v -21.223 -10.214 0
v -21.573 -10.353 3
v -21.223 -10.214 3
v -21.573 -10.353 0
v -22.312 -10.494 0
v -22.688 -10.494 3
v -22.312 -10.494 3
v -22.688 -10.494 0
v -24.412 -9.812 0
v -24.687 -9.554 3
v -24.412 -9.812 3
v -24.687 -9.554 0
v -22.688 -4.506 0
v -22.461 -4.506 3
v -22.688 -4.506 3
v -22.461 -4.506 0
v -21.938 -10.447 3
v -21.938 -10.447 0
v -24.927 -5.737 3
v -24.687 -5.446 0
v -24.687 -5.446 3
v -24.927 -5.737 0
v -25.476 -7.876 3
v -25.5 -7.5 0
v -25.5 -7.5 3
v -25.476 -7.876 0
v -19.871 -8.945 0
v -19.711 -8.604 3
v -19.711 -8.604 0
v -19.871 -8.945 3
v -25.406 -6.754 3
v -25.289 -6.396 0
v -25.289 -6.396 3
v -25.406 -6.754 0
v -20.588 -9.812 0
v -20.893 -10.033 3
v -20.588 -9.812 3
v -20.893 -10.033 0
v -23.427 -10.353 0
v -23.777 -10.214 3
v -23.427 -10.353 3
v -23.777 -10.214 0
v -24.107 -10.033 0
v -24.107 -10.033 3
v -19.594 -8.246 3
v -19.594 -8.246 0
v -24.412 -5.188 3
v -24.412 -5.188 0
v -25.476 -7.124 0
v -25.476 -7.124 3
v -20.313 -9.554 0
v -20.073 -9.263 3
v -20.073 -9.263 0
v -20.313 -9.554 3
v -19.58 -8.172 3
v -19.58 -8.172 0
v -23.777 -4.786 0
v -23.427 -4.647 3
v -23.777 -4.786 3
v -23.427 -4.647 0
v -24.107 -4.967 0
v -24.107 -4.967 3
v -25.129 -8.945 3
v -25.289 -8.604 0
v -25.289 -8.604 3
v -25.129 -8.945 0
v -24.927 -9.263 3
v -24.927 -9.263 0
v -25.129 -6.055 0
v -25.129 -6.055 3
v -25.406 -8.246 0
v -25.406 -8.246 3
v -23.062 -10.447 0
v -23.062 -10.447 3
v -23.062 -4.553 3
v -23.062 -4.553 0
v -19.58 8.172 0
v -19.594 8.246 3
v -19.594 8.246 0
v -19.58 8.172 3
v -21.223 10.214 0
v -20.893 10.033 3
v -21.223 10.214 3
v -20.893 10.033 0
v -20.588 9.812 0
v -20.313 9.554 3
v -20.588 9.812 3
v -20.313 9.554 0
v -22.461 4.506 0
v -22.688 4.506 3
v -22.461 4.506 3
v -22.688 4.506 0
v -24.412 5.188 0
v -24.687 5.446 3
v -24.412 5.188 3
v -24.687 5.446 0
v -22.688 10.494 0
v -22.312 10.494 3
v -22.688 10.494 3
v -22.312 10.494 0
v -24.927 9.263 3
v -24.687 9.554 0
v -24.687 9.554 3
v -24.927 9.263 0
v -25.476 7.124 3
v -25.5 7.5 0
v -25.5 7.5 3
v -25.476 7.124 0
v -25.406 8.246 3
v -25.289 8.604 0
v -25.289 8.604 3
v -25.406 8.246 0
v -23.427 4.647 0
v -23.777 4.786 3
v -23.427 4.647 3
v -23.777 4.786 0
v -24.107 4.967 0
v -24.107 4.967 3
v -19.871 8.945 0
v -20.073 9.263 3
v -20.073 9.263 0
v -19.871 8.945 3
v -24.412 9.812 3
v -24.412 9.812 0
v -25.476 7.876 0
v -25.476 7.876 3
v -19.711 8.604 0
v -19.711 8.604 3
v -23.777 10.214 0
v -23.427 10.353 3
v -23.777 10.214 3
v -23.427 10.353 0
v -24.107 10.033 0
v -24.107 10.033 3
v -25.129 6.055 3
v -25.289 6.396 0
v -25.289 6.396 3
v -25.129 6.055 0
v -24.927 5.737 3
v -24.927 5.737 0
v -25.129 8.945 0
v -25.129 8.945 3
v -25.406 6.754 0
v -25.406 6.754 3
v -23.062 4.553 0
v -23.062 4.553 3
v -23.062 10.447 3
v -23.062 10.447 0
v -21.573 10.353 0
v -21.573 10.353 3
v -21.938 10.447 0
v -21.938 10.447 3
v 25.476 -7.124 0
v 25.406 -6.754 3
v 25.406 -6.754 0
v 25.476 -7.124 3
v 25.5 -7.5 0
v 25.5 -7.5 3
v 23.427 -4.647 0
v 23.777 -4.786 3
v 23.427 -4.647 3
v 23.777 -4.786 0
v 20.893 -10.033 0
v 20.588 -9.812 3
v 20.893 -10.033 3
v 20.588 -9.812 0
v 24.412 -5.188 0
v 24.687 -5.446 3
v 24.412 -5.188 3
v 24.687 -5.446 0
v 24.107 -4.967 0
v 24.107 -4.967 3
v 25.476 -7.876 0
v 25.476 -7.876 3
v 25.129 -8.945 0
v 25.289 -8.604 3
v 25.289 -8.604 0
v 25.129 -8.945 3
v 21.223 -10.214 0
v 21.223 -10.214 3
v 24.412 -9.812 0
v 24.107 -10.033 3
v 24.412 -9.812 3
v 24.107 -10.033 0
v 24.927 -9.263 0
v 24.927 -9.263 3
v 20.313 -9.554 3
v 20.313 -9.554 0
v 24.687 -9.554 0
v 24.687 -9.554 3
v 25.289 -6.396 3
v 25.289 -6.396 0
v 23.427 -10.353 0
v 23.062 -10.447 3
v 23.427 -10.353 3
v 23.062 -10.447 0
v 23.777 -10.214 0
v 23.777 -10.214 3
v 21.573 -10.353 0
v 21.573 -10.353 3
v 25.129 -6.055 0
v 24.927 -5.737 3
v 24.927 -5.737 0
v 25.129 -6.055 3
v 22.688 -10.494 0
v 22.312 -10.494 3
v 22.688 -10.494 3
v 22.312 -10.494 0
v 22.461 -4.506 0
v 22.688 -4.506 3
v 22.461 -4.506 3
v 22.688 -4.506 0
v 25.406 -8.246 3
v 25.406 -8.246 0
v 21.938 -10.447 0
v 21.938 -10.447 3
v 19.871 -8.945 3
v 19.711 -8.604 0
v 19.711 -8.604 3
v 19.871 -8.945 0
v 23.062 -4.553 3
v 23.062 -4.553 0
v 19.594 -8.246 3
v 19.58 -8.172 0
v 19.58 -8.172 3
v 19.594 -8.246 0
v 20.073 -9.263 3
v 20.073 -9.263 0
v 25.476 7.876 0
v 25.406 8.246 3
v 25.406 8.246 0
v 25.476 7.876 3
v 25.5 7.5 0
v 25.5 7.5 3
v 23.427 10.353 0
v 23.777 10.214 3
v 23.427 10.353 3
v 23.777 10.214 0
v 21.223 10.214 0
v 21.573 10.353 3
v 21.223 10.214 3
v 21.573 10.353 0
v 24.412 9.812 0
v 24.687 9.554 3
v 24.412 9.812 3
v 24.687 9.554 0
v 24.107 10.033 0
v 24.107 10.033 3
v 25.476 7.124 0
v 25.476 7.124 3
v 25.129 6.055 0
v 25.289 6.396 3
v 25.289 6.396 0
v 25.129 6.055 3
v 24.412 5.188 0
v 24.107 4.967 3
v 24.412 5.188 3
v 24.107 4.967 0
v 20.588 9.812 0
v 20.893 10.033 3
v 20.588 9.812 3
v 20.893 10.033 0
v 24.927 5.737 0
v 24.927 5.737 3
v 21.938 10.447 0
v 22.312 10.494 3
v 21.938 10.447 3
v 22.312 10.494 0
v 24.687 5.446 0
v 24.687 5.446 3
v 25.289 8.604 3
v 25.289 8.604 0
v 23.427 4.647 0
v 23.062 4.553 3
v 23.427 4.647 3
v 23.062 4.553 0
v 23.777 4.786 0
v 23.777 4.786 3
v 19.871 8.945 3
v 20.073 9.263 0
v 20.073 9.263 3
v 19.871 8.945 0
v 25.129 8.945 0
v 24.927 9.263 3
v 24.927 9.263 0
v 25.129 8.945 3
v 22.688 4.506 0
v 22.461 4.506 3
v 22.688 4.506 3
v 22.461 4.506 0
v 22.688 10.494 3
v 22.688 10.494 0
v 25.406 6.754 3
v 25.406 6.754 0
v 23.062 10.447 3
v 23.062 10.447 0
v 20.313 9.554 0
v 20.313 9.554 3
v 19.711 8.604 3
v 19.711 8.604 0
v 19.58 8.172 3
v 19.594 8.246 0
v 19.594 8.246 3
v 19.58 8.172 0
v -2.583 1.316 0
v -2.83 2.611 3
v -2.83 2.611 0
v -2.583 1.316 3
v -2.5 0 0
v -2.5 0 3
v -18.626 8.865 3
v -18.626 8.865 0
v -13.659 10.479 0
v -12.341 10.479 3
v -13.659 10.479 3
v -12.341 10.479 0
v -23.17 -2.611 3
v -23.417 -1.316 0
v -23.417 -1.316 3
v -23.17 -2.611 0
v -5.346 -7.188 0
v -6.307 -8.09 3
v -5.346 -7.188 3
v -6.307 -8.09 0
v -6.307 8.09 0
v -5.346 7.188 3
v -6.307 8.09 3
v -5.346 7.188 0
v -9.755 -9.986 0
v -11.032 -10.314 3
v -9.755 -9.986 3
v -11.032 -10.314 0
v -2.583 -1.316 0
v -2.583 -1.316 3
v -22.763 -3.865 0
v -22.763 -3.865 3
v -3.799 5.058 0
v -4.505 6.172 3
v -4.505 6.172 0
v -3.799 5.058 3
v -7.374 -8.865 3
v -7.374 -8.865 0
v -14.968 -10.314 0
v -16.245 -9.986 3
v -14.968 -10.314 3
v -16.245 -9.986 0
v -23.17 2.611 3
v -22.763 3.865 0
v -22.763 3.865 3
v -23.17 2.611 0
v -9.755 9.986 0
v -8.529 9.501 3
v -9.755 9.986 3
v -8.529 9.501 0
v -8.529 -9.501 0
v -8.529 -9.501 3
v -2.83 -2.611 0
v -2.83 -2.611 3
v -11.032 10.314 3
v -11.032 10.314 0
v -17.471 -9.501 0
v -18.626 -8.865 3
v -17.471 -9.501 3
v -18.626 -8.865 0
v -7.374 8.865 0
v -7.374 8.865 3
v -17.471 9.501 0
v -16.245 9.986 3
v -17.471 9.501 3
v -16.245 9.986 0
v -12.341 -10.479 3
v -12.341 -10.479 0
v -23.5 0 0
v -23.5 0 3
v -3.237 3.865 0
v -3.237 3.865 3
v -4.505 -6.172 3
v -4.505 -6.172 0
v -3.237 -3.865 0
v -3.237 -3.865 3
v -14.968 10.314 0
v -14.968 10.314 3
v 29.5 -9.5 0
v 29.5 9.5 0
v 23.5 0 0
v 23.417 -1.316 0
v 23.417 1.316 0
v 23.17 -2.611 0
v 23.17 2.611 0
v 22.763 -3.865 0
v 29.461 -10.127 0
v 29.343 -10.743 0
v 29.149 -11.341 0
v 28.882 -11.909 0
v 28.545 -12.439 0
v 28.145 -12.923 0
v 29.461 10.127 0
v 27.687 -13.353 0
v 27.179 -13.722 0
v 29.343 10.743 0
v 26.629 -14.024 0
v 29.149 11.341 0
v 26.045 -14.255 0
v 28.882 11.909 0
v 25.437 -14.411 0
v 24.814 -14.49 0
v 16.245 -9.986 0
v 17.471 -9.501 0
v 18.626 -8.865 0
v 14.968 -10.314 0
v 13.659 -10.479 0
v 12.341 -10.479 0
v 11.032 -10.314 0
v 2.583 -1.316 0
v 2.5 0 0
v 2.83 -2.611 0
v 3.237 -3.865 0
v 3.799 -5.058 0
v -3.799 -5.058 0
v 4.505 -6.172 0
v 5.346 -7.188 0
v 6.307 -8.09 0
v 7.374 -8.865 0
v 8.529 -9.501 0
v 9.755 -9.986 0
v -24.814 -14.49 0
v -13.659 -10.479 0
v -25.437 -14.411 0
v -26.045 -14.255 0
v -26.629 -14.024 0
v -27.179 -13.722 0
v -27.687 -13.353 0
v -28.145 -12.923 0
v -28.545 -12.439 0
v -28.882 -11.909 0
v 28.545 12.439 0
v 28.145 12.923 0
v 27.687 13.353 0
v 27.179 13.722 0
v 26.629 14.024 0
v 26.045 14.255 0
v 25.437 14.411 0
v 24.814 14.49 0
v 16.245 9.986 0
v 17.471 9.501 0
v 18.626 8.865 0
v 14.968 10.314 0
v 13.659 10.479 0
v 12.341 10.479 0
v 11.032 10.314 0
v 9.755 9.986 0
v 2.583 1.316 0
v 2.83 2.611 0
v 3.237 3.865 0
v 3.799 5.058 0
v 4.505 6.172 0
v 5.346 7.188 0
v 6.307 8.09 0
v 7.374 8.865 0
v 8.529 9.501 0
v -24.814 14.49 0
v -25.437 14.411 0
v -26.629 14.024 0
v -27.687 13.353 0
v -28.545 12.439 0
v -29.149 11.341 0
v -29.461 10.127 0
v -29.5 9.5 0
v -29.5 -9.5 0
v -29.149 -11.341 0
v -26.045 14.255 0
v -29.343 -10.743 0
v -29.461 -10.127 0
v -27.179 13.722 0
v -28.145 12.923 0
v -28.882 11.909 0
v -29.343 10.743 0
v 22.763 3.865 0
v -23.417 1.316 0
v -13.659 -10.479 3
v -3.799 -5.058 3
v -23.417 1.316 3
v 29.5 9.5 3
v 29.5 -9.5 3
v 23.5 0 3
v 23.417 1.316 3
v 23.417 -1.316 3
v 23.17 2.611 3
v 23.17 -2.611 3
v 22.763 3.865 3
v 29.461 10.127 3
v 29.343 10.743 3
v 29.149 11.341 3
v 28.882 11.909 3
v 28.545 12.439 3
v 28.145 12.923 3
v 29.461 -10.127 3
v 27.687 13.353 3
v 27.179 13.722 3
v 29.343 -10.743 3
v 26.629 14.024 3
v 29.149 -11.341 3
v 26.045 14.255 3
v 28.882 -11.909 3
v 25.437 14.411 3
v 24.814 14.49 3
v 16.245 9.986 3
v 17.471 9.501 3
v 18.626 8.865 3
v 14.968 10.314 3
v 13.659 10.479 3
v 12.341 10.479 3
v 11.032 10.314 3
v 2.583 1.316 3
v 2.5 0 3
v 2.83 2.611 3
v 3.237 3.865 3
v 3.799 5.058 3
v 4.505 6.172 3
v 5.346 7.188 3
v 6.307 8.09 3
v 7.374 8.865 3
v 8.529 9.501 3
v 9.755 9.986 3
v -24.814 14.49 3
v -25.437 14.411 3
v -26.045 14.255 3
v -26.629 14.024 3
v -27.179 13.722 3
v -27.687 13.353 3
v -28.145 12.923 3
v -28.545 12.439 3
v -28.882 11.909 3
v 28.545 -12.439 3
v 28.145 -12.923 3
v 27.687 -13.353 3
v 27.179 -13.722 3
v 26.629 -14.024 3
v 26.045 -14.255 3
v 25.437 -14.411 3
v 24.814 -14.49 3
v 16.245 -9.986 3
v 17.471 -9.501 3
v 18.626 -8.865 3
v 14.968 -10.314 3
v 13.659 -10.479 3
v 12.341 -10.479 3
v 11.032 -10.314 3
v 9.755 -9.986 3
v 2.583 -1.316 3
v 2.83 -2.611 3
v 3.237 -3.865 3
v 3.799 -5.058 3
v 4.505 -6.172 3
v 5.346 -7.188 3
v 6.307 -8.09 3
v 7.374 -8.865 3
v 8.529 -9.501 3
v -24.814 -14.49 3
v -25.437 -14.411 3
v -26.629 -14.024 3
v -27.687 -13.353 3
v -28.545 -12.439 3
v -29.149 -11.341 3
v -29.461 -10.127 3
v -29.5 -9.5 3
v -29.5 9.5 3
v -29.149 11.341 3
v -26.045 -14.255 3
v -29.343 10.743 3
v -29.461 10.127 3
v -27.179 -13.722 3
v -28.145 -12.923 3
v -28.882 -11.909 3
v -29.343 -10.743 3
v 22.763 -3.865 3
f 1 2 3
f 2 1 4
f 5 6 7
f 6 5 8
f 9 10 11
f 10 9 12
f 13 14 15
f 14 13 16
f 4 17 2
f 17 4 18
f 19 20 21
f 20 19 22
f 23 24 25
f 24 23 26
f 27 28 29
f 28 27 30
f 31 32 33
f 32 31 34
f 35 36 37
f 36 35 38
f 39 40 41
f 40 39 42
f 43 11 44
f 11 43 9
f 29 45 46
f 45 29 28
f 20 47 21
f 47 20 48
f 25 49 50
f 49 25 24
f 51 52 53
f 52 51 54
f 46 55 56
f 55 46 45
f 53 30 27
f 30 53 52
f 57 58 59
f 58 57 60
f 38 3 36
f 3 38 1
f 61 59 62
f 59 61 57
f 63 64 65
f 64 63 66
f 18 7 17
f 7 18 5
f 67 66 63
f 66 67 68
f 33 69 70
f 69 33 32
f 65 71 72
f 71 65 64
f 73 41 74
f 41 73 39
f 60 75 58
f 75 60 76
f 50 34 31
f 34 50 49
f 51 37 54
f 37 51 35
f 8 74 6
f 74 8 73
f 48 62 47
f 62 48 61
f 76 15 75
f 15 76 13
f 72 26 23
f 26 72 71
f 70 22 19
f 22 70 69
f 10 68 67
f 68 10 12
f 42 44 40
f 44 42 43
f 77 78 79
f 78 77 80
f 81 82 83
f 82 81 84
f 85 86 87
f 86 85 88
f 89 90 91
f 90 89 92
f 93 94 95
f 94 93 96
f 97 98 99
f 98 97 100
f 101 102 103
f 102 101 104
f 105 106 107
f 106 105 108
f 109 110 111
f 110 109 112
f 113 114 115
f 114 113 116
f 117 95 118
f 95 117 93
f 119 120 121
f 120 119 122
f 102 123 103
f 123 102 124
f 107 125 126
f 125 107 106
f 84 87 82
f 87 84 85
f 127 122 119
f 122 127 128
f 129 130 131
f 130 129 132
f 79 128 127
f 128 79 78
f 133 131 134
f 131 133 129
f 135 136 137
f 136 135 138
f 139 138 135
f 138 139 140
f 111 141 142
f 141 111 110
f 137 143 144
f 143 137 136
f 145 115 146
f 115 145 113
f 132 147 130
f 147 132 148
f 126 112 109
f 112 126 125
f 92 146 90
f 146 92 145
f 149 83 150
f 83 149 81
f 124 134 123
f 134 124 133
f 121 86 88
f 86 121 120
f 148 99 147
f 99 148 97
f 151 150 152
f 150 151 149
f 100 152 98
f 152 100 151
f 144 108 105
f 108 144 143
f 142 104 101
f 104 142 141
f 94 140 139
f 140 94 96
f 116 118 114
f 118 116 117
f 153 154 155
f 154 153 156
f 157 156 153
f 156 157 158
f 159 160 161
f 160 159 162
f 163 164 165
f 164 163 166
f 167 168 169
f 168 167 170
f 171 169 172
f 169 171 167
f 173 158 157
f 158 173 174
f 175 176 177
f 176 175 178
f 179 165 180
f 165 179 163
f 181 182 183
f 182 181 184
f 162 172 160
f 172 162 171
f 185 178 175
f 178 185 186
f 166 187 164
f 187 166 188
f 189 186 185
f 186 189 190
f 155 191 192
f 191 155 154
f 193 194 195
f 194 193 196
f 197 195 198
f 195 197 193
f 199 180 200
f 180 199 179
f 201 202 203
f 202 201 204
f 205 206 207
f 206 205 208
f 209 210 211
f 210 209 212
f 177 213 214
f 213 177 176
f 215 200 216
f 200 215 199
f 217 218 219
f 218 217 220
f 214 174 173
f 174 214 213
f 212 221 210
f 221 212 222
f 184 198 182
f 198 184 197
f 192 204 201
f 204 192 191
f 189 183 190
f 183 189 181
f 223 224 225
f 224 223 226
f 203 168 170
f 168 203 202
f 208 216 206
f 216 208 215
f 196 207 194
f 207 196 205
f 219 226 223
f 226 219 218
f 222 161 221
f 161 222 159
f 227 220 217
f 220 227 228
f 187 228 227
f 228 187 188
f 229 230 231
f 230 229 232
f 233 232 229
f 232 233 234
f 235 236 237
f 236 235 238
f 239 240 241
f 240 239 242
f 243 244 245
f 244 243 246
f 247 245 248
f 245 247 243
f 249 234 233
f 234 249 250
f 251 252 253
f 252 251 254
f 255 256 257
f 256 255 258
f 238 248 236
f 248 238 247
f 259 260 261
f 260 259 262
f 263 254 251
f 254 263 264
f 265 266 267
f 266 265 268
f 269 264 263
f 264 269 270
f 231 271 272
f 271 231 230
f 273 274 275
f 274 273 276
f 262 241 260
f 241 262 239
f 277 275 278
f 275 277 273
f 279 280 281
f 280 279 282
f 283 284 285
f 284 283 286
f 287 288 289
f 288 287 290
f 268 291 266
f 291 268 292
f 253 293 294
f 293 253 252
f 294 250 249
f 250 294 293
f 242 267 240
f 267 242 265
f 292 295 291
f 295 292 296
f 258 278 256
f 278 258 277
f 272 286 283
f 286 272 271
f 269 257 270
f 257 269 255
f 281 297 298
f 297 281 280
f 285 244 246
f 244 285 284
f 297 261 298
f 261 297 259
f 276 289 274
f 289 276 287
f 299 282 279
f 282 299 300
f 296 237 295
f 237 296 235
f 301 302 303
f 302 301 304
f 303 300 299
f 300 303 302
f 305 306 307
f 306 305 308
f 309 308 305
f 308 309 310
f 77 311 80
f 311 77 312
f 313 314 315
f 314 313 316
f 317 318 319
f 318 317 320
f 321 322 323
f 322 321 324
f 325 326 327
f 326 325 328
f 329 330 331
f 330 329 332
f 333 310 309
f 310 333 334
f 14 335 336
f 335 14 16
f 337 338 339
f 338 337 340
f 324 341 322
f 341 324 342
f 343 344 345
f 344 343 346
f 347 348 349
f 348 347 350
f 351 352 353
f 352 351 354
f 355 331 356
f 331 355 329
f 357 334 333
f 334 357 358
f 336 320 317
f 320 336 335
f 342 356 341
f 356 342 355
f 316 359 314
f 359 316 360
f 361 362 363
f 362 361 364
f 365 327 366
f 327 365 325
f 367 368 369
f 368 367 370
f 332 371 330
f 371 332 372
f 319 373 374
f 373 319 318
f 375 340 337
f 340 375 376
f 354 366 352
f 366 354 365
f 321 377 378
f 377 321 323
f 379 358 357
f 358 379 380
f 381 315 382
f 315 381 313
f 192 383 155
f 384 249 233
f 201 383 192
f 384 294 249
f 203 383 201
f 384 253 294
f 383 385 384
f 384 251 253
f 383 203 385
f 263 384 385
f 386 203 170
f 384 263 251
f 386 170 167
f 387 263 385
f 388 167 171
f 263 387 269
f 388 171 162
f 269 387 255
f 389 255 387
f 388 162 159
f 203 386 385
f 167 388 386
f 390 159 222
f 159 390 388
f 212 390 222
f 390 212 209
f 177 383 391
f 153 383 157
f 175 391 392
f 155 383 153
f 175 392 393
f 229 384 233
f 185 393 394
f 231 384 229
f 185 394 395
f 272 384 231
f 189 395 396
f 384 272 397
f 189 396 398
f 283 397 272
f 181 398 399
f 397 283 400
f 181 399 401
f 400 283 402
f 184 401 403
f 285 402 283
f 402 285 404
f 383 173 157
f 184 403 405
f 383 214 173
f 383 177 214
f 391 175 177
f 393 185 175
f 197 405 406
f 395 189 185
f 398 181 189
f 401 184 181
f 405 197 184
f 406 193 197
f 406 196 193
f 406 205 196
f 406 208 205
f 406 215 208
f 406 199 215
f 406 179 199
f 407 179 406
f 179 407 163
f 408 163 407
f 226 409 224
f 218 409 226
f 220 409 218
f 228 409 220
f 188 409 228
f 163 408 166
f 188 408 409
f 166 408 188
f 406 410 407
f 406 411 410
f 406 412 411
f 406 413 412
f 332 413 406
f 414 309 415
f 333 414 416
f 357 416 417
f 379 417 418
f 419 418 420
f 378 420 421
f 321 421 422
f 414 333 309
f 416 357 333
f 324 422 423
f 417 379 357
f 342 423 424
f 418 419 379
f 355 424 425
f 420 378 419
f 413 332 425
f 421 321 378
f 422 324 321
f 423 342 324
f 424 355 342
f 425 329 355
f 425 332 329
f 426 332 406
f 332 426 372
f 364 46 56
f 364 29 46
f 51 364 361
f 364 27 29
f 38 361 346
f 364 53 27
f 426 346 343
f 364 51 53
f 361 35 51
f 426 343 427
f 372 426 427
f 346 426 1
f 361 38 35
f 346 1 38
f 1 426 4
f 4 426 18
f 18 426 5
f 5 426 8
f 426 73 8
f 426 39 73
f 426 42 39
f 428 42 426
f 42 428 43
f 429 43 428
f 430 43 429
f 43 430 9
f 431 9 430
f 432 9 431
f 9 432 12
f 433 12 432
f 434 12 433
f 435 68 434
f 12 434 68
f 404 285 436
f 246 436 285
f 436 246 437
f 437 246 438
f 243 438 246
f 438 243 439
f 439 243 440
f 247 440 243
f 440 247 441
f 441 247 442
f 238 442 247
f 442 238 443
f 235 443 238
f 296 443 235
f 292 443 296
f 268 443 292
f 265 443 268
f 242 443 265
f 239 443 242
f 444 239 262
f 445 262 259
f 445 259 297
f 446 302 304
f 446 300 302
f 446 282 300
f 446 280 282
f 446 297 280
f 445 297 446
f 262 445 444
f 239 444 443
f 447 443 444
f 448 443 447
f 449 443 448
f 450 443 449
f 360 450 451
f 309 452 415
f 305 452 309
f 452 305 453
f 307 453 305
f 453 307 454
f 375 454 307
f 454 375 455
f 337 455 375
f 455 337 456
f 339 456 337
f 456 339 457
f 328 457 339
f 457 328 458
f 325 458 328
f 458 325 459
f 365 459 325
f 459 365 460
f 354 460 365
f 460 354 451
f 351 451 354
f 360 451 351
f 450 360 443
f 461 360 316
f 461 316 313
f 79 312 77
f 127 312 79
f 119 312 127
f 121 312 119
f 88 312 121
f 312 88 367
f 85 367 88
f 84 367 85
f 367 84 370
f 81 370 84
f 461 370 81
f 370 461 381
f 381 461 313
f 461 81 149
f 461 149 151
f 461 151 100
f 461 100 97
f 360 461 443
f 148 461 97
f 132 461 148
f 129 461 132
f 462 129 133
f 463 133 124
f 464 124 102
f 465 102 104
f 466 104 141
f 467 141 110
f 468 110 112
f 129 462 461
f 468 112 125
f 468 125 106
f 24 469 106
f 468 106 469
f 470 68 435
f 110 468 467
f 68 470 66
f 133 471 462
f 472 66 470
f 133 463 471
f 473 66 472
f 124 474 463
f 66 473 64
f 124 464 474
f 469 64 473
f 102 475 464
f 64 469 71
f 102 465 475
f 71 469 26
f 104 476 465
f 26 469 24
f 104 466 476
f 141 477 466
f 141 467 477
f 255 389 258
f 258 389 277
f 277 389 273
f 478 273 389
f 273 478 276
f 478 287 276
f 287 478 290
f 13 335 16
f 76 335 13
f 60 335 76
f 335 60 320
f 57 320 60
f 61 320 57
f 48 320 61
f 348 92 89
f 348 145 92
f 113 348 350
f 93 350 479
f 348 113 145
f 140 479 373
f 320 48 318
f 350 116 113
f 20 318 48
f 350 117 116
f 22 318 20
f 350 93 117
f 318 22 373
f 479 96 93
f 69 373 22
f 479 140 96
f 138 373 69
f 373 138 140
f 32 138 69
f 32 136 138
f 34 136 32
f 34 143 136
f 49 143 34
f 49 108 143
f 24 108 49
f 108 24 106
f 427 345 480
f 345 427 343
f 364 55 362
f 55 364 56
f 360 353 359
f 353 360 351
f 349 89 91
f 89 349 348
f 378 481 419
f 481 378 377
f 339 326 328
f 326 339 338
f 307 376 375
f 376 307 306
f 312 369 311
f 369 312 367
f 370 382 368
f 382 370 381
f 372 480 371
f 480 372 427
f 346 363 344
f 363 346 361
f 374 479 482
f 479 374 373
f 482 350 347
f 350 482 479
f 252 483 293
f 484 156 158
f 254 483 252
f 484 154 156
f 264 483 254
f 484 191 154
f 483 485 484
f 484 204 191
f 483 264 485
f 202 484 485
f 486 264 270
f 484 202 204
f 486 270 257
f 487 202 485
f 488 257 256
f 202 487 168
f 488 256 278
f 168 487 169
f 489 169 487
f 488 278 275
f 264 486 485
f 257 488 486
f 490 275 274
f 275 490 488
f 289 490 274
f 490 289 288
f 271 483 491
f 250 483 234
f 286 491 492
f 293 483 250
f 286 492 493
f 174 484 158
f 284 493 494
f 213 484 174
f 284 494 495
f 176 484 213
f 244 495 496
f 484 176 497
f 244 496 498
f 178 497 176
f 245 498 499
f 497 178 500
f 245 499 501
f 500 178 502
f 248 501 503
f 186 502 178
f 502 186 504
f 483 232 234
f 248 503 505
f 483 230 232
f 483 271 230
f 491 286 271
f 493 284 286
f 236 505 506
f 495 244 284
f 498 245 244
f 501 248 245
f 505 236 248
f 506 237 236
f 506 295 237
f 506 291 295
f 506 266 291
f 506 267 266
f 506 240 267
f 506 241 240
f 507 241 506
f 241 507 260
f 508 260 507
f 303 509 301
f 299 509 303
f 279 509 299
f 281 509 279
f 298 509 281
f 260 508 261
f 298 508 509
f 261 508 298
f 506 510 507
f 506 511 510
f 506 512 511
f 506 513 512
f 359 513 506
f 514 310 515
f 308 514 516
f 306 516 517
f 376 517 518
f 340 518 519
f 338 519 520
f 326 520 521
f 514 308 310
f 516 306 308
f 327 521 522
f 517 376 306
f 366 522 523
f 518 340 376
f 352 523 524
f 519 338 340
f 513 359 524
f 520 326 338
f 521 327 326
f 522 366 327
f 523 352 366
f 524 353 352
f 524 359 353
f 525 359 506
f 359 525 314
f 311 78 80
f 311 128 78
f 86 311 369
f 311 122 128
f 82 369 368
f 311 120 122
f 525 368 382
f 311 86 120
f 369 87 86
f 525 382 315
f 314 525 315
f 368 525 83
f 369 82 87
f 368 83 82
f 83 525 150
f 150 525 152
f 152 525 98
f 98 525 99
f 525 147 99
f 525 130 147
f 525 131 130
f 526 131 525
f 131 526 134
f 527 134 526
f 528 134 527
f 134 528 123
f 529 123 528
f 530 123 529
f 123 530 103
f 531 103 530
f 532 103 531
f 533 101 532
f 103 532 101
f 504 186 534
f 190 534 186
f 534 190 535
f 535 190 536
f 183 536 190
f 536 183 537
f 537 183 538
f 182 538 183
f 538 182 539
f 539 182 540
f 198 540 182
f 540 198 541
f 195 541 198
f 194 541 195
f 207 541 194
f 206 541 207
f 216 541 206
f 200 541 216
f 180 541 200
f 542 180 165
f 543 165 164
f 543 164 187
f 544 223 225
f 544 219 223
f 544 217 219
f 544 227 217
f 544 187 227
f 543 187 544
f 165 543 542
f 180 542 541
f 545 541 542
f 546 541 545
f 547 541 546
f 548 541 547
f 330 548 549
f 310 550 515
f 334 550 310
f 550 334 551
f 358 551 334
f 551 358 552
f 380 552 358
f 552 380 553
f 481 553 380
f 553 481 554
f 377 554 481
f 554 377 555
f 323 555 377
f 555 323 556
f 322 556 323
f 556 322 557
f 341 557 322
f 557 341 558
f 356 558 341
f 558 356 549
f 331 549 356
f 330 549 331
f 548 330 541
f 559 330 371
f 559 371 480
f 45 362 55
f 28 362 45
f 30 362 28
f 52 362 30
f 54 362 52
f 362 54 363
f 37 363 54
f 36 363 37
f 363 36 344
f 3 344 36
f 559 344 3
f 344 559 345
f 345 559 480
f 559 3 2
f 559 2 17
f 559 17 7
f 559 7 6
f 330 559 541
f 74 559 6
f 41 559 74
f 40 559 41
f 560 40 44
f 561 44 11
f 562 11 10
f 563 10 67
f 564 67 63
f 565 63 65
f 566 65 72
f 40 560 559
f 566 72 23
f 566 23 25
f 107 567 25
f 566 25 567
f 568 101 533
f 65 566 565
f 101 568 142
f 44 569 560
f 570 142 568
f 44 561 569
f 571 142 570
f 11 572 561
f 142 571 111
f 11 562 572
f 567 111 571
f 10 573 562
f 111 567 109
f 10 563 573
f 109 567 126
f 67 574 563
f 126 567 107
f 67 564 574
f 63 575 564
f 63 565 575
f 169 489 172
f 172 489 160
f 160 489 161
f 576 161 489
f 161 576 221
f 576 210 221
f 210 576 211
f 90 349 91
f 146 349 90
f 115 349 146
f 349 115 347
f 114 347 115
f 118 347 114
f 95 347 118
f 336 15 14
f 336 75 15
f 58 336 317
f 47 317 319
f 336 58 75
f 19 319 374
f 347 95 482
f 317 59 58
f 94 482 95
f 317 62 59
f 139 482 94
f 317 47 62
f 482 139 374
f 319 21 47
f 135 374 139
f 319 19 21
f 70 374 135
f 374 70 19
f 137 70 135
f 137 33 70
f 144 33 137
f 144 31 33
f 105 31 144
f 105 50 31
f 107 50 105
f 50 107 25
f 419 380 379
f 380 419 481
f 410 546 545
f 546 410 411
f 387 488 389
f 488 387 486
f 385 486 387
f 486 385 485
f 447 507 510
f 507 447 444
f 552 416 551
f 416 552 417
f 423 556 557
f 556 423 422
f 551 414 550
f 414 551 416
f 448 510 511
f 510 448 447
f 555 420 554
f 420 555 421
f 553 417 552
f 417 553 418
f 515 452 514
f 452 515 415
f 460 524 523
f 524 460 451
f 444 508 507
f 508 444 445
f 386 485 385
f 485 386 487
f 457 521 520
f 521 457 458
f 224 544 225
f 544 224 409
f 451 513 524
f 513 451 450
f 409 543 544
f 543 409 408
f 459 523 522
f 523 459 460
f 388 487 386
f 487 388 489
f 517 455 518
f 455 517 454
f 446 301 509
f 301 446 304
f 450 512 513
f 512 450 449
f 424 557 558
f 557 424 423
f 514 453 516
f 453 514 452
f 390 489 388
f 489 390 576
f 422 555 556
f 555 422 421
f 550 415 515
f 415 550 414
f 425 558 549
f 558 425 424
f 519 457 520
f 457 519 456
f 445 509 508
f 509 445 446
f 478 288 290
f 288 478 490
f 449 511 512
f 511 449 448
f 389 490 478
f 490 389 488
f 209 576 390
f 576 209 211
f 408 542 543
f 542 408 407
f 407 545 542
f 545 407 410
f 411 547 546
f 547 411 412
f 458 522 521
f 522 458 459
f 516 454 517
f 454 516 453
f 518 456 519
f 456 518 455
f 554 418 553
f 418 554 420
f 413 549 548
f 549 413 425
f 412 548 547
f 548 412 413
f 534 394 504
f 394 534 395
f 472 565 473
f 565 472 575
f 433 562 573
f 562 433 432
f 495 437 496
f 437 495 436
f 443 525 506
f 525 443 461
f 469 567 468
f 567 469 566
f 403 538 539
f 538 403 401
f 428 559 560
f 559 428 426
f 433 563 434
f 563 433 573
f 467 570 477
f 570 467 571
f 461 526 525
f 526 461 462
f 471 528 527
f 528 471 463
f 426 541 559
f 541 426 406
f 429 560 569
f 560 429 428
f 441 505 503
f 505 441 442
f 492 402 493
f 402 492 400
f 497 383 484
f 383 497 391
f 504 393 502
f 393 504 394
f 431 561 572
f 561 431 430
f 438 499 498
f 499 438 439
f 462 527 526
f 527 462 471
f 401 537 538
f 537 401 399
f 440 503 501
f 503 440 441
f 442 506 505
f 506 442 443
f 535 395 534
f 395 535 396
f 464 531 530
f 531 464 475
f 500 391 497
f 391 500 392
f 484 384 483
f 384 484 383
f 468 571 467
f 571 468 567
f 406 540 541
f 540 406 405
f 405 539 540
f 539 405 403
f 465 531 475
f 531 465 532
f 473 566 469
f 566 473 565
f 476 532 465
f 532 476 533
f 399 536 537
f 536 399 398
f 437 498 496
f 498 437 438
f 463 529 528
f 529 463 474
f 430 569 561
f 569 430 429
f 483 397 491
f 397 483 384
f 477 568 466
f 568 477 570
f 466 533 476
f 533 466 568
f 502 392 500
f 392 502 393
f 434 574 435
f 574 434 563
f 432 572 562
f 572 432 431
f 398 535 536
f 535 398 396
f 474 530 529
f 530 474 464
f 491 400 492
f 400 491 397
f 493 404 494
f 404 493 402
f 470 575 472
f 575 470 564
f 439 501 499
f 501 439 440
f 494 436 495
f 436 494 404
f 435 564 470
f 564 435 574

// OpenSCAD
$fn = 50;


difference() {
	union() {
		hull() {
			translate(v = [-24.5000000000, 9.5000000000, 0]) {
				cylinder(h = 3, r = 5);
			}
			translate(v = [24.5000000000, 9.5000000000, 0]) {
				cylinder(h = 3, r = 5);
			}
			translate(v = [-24.5000000000, -9.5000000000, 0]) {
				cylinder(h = 3, r = 5);
			}
			translate(v = [24.5000000000, -9.5000000000, 0]) {
				cylinder(h = 3, r = 5);
			}
		}
	}
	union() {
		#translate(v = [-22.5000000000, -7.5000000000, -100.0000000000]) {
			cylinder(h = 200, r = 3.0000000000);
		}
		#translate(v = [-22.5000000000, 7.5000000000, -100.0000000000]) {
			cylinder(h = 200, r = 3.0000000000);
		}
		#translate(v = [22.5000000000, -7.5000000000, -100.0000000000]) {
			cylinder(h = 200, r = 3.0000000000);
		}
		#translate(v = [22.5000000000, 7.5000000000, -100.0000000000]) {
			cylinder(h = 200, r = 3.0000000000);
		}
		#translate(v = [-13.0000000000, 0, 0]) {
			cylinder(h = 3, r = 10.5000000000);
		}
		#translate(v = [13.0000000000, 0, 0]) {
			cylinder(h = 3, r = 10.5000000000);
		}
	}
}
